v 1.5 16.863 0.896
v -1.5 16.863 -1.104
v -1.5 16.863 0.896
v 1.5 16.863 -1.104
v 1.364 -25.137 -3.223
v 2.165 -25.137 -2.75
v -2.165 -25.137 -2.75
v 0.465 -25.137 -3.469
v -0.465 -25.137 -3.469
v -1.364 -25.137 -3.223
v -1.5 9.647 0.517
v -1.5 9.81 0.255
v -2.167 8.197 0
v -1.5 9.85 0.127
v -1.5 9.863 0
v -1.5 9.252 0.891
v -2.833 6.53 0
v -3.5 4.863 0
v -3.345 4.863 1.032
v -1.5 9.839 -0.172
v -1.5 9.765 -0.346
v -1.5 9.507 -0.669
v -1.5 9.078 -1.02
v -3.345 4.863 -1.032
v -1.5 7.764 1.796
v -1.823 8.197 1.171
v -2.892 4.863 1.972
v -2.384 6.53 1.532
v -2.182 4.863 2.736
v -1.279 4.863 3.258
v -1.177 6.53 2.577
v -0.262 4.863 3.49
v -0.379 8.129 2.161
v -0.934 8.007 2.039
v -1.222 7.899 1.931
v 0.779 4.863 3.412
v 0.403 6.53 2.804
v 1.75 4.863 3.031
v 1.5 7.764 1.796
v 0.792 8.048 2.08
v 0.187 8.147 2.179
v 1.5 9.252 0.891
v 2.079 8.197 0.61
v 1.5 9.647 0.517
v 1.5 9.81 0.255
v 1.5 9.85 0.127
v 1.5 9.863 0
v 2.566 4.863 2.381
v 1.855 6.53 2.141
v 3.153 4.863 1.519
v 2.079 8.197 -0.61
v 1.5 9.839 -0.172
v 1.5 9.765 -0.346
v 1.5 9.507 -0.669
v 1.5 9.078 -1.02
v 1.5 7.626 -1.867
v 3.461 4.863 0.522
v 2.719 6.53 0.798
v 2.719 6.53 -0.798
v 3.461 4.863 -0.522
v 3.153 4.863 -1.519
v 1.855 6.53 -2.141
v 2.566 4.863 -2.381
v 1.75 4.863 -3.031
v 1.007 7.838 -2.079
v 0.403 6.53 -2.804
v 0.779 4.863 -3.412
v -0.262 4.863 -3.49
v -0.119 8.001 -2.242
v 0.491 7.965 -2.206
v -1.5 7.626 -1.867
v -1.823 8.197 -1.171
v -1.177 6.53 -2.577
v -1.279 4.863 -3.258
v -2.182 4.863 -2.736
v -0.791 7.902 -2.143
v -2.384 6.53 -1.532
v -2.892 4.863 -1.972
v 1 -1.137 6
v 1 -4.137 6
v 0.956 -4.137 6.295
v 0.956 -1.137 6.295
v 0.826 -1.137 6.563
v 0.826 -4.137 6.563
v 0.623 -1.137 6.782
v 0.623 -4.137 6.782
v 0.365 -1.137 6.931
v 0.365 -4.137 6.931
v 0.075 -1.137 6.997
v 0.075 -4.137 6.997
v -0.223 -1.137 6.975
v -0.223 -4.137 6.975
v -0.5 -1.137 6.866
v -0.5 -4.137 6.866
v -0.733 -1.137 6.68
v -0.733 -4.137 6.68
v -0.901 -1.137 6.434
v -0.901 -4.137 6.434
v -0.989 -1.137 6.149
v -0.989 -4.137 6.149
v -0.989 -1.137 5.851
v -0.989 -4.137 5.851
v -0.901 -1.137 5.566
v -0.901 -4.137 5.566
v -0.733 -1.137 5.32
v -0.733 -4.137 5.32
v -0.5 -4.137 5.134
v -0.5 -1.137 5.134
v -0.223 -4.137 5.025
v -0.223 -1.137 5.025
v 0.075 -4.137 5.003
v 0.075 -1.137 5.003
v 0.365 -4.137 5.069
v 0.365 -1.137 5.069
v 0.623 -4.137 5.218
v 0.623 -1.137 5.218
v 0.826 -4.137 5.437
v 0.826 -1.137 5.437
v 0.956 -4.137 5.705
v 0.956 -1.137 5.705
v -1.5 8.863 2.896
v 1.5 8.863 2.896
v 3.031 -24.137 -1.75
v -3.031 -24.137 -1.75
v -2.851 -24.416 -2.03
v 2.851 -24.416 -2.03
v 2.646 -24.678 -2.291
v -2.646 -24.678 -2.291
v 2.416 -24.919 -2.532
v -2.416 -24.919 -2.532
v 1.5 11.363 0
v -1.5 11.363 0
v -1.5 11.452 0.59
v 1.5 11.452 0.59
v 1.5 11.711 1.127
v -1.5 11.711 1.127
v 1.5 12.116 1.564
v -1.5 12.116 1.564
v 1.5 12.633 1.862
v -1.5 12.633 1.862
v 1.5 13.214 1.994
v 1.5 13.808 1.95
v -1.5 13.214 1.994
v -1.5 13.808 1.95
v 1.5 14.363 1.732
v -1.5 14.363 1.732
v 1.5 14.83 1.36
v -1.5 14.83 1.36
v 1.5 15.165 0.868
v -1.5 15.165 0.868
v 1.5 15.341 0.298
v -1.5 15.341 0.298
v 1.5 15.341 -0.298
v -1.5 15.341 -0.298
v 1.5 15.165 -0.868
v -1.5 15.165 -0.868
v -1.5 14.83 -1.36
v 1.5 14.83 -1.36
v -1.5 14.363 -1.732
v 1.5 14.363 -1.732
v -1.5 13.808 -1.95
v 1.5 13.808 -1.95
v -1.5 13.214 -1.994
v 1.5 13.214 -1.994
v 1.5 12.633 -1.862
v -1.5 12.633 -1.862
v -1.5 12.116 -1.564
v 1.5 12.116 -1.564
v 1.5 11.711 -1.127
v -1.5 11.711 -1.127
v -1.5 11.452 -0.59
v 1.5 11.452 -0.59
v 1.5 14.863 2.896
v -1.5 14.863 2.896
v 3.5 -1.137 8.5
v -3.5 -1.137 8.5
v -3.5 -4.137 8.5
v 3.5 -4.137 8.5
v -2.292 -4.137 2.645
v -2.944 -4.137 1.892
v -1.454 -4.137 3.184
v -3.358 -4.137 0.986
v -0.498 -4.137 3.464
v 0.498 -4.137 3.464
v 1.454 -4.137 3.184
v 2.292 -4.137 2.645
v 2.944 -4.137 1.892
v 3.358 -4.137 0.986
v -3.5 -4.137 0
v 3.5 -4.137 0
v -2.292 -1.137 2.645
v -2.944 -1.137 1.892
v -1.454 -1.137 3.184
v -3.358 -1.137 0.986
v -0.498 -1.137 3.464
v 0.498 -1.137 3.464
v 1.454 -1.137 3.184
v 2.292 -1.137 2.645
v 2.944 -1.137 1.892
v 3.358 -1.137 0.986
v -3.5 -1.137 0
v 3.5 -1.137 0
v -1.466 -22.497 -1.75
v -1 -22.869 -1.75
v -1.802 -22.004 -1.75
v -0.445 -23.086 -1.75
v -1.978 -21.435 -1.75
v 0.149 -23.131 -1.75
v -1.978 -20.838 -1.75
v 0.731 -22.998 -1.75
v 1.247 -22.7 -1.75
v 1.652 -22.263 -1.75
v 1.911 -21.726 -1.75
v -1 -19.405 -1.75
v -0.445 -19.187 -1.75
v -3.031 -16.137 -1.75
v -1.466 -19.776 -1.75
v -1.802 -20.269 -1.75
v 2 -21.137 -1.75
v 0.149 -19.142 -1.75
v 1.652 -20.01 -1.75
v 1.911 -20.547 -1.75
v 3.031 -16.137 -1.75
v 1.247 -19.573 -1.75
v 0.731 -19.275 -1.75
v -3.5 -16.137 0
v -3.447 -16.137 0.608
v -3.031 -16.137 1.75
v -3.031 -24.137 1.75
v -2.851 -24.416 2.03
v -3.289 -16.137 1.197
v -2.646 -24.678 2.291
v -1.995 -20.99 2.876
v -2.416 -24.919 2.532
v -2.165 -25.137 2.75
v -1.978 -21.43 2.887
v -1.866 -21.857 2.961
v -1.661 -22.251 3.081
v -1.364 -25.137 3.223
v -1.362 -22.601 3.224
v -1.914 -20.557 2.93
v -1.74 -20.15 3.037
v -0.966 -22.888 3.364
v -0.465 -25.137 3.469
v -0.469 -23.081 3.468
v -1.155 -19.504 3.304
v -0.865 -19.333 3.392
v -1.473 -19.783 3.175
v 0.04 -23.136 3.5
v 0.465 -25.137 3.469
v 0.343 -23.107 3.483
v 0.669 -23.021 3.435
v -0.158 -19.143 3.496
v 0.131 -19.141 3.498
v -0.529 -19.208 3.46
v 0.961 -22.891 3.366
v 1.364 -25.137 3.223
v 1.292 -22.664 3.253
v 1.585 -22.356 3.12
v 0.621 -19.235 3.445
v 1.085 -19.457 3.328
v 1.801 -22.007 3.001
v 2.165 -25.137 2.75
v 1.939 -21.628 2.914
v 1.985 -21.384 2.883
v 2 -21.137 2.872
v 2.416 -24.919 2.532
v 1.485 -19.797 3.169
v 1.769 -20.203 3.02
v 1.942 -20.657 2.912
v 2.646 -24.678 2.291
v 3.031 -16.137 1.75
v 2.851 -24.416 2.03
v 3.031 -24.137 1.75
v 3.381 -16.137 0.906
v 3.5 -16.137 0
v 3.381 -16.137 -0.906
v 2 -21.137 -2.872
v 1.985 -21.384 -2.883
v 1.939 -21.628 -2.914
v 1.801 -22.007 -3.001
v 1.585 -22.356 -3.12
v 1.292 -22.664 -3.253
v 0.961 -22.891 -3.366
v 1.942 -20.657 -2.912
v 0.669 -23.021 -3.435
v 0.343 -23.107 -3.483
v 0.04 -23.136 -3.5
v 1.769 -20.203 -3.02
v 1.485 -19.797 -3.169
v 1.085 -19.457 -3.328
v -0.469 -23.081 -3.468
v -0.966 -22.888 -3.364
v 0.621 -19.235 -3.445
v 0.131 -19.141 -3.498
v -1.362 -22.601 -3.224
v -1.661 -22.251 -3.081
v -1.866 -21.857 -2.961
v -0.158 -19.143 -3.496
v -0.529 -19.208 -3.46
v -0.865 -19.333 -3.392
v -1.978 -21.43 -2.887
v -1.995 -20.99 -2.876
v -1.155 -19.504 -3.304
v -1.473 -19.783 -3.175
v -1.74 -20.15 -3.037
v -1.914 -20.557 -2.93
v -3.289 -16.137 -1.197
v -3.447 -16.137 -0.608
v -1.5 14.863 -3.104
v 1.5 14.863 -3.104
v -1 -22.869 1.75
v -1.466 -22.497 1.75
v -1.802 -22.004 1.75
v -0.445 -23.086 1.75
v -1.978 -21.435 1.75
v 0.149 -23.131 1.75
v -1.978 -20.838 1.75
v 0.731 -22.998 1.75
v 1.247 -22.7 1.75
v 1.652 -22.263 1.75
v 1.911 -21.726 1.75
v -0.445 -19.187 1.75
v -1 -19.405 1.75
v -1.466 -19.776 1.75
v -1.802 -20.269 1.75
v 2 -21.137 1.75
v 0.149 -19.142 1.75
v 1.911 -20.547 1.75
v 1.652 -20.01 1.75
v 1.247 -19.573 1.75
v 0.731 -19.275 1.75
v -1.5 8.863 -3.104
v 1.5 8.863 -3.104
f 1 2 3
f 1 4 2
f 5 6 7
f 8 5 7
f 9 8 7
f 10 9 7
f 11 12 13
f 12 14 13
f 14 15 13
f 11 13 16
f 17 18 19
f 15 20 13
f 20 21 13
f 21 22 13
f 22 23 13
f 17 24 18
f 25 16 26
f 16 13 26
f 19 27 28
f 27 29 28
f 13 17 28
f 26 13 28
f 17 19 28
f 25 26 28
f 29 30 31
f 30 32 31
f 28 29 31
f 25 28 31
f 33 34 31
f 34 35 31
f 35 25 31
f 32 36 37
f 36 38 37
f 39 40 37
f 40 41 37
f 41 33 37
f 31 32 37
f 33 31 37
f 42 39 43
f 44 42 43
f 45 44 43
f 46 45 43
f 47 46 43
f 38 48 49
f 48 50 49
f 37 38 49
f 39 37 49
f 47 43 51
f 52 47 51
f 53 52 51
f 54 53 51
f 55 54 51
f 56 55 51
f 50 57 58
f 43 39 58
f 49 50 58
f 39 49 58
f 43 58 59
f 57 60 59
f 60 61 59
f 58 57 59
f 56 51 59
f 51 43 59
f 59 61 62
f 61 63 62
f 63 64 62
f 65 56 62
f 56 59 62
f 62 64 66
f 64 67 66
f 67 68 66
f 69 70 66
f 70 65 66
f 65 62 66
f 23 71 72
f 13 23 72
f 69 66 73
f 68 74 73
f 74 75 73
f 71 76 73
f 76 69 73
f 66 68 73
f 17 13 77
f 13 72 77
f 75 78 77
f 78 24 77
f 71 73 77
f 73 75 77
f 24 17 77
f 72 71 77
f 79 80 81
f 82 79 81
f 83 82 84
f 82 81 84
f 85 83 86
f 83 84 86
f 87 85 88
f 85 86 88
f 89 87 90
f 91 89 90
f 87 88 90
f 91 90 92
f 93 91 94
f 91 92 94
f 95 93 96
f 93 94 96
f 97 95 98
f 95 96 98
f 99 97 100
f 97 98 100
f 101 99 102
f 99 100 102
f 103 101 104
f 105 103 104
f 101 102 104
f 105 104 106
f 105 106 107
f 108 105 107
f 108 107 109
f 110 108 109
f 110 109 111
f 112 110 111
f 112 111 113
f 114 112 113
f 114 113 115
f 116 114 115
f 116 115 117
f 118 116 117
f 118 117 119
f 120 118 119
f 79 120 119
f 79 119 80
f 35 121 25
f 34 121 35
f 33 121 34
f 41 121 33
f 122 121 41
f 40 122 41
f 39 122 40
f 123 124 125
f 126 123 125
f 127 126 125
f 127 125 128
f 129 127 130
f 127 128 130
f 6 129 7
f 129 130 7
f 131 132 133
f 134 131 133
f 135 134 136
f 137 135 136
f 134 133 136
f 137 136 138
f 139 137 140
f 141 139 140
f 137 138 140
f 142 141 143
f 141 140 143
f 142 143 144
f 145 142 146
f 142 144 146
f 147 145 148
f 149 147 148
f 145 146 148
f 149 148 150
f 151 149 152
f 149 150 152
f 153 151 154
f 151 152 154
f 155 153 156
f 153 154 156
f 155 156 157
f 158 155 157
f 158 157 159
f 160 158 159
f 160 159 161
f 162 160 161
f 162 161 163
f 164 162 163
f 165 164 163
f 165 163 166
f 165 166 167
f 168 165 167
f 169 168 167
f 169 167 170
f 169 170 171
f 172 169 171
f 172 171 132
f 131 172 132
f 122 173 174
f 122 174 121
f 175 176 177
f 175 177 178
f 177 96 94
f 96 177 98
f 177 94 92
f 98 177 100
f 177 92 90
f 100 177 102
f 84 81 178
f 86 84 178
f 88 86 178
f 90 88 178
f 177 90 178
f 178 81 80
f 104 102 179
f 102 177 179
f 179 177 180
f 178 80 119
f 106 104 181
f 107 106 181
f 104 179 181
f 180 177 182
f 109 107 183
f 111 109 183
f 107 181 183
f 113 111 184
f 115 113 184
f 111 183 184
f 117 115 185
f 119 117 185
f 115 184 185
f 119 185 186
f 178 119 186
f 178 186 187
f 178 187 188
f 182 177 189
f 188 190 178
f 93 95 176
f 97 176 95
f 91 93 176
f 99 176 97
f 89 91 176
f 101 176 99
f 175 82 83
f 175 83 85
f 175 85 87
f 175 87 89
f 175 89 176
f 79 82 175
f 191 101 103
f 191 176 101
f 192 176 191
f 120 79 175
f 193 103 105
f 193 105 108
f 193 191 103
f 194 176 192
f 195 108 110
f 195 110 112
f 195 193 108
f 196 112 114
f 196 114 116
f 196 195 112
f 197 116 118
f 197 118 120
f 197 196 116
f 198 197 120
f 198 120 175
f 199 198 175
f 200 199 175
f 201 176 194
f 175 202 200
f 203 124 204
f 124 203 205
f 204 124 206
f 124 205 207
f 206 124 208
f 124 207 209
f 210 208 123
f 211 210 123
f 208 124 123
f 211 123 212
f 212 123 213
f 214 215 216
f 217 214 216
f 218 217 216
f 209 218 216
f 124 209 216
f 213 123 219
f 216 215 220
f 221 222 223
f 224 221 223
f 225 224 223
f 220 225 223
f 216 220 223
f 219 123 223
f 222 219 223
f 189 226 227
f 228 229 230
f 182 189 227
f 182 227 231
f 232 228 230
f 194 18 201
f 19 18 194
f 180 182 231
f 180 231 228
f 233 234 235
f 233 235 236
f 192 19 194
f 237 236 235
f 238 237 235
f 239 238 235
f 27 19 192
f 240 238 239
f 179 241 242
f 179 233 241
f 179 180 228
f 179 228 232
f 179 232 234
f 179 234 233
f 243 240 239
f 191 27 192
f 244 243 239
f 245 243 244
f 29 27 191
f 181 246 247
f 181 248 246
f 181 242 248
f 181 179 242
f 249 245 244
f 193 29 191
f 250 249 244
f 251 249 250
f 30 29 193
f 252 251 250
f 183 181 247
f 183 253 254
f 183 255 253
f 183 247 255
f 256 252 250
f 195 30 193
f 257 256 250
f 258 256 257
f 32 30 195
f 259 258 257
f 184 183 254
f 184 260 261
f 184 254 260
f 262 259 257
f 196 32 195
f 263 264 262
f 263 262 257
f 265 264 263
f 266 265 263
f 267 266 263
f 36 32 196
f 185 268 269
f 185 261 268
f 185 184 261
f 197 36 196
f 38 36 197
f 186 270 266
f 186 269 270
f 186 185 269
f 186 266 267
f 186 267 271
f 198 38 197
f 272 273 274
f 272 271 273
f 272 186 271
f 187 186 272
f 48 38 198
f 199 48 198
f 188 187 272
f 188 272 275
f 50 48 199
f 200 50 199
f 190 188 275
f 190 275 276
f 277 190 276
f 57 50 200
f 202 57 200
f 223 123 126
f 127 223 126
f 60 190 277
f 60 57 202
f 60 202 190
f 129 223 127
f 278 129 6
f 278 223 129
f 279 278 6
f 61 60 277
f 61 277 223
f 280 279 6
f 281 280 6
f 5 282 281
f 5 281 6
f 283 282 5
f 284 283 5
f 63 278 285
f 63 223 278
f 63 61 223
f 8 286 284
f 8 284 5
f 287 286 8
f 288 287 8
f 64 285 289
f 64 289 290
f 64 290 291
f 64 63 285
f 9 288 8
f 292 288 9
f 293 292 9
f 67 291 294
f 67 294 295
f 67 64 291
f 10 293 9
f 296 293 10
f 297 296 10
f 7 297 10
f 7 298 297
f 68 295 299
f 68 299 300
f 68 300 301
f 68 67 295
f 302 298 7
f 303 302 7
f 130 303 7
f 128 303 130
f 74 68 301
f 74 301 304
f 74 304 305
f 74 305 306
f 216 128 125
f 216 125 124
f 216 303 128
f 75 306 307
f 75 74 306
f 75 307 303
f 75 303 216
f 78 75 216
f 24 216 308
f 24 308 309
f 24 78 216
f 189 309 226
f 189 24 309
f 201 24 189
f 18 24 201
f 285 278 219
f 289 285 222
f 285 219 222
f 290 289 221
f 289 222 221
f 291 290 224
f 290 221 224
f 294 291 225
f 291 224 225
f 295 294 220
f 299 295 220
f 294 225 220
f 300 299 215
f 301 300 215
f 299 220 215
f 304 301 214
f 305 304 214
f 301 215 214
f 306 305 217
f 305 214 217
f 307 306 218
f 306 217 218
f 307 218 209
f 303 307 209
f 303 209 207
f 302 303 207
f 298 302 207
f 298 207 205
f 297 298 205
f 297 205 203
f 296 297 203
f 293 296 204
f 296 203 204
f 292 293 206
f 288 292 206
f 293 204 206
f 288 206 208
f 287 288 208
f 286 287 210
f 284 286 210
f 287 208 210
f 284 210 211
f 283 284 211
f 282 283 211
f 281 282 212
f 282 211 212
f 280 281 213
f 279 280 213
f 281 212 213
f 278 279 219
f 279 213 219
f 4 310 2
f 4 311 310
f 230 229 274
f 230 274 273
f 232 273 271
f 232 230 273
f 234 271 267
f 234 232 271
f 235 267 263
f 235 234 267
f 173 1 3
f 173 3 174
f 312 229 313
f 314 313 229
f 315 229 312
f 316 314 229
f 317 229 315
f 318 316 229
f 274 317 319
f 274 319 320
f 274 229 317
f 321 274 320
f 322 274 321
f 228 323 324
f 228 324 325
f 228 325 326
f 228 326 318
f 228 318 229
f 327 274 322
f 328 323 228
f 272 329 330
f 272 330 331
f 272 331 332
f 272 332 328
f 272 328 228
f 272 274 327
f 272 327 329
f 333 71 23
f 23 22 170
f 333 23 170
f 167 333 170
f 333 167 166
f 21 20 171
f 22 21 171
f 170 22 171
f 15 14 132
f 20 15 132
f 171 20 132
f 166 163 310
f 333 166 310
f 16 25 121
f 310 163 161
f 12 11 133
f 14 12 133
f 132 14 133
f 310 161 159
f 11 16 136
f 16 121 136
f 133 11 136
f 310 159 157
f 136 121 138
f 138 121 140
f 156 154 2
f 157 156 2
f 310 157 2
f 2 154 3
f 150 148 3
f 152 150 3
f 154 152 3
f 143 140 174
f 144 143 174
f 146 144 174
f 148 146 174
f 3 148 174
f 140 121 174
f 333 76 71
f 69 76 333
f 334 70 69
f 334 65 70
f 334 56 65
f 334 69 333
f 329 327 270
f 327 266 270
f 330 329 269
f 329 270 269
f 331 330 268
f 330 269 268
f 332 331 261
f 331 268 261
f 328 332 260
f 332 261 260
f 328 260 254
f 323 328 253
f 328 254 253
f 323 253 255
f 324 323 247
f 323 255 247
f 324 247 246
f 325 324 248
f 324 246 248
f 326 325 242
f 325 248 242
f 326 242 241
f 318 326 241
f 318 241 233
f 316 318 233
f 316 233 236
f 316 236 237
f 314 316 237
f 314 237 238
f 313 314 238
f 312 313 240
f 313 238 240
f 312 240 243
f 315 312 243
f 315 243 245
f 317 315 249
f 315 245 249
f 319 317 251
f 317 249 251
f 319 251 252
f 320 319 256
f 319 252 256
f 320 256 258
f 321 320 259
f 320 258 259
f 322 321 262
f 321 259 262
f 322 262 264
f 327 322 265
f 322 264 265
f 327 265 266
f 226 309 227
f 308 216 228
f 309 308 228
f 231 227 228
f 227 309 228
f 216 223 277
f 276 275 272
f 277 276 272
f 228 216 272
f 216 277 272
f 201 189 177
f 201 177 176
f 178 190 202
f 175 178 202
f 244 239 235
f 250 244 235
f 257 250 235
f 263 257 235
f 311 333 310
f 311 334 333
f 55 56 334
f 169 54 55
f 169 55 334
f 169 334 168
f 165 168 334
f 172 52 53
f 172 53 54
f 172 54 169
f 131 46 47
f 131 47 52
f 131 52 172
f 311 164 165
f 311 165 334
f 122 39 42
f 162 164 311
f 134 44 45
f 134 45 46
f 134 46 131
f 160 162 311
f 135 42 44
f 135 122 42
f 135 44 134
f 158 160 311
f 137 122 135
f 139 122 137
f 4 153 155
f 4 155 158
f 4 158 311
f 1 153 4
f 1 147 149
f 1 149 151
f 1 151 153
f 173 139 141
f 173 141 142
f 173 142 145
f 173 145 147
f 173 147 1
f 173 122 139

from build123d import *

# Parameters (mm, degrees)
F1_DEPTH     = 1.5
F2_R         = 2
F3_DEPTH     = 3.001
F6_DEPTH     = 30
F7_W         = 14.9228225192
F7_H         = 3.5
F8_DEPTH     = 12.5
F9_W         = 7
F9_H         = 3
F10_DEPTH    = 8.5
F11_R        = 2
F12_DEPTH    = 12.5
F13_R        = 1
F14_DEPTH    = 21.001
F15_T1_DEPTH = 11.2055438024


# Not quite as in the source:
# - a fillet or chamfer that OpenCascade refuses, or shapes differently, is made with other operations: its cross-section is extruded or revolved along the edge and cut away or added


with BuildPart() as f1:
    # F0 (on Right) → F1 (new body, symmetric)
    with BuildSketch(Plane.YZ):
        Polygon((16.8634157784, -1.1044778318), (16.8634157784, 0.8955221682), (14.8634157784, 2.8955221682), (8.8634157784, 2.8955221682), (6.8634157784, 0.8955221682), (6.8634157784, -1.1044778318), (8.8634157784, -3.1044778318), (14.8634157784, -3.1044778318), align=None)
    extrude(amount=F1_DEPTH, both=True)

    # F2 (on face) → F3 (cut, through all)
    with BuildSketch(Plane(origin=(-1.5, 0, 0), x_dir=(0, -1, 0), z_dir=(-1, 0, 0))):
        with Locations((-13.3634157784, 0)):
            Circle(F2_R)
    extrude(amount=-F3_DEPTH, mode=Mode.SUBTRACT)

    # F4 (on Top) → F5 (revolve)
    with BuildSketch(Plane.XY):
        Polygon((0, 4.8634157784), (0, 9.8634157784), (-1.5, 9.8634157784), (-3.5, 4.8634157784), align=None)
    revolve(axis=Axis((0, 7.3634157784, 0), (0, 1, 0)))

    # F6 (add): a face of the model
    f6_faces = [f1.faces().sort_by_distance(p)[0] for p in [
        (0, 4.8634157784, 0),
    ]]
    extrude(f6_faces, amount=F6_DEPTH)

    # F7 (on Right) → F8 (cut, symmetric)
    with BuildSketch(Plane.YZ):
        with Locations((-23.5979954812, 0)):
            Rectangle(F7_W, F7_H)
    extrude(amount=F8_DEPTH, both=True, mode=Mode.SUBTRACT)

    # F9 (on Top) → F10 (join)
    with BuildSketch(Plane.XY):
        with Locations((0, -2.6365842216)):
            Rectangle(F9_W, F9_H)
    extrude(amount=F10_DEPTH)

    # F11 (on Top) → F12 (cut, symmetric)
    with BuildSketch(Plane.XY):
        with Locations((0, -21.1365842216)):
            Circle(F11_R)
    extrude(amount=F12_DEPTH, both=True, mode=Mode.SUBTRACT)

    # F13 (on face) → F14 (cut, through all)
    with BuildSketch(Plane.XZ.offset(4.1365842216)):
        with Locations((0, 6)):
            Circle(F13_R)
    extrude(amount=-F14_DEPTH, mode=Mode.SUBTRACT)

    # F15: chamfer of 1 on 2 edges, made by hand

    # F15_s2 → F15_t1 (cut)
    with BuildSketch(Plane.YZ.offset(-5.6027719012)):
        Polygon((-24.1365842216, -1.75), (-25.1365842216, -2.75), (-25.1365842216, -1.75), align=None)
        Polygon((-24.1365842216, 1.75), (-25.1365842216, 2.75), (-25.1365842216, 1.75), align=None)
    extrude(amount=F15_T1_DEPTH, mode=Mode.SUBTRACT)


solid = f1.part
